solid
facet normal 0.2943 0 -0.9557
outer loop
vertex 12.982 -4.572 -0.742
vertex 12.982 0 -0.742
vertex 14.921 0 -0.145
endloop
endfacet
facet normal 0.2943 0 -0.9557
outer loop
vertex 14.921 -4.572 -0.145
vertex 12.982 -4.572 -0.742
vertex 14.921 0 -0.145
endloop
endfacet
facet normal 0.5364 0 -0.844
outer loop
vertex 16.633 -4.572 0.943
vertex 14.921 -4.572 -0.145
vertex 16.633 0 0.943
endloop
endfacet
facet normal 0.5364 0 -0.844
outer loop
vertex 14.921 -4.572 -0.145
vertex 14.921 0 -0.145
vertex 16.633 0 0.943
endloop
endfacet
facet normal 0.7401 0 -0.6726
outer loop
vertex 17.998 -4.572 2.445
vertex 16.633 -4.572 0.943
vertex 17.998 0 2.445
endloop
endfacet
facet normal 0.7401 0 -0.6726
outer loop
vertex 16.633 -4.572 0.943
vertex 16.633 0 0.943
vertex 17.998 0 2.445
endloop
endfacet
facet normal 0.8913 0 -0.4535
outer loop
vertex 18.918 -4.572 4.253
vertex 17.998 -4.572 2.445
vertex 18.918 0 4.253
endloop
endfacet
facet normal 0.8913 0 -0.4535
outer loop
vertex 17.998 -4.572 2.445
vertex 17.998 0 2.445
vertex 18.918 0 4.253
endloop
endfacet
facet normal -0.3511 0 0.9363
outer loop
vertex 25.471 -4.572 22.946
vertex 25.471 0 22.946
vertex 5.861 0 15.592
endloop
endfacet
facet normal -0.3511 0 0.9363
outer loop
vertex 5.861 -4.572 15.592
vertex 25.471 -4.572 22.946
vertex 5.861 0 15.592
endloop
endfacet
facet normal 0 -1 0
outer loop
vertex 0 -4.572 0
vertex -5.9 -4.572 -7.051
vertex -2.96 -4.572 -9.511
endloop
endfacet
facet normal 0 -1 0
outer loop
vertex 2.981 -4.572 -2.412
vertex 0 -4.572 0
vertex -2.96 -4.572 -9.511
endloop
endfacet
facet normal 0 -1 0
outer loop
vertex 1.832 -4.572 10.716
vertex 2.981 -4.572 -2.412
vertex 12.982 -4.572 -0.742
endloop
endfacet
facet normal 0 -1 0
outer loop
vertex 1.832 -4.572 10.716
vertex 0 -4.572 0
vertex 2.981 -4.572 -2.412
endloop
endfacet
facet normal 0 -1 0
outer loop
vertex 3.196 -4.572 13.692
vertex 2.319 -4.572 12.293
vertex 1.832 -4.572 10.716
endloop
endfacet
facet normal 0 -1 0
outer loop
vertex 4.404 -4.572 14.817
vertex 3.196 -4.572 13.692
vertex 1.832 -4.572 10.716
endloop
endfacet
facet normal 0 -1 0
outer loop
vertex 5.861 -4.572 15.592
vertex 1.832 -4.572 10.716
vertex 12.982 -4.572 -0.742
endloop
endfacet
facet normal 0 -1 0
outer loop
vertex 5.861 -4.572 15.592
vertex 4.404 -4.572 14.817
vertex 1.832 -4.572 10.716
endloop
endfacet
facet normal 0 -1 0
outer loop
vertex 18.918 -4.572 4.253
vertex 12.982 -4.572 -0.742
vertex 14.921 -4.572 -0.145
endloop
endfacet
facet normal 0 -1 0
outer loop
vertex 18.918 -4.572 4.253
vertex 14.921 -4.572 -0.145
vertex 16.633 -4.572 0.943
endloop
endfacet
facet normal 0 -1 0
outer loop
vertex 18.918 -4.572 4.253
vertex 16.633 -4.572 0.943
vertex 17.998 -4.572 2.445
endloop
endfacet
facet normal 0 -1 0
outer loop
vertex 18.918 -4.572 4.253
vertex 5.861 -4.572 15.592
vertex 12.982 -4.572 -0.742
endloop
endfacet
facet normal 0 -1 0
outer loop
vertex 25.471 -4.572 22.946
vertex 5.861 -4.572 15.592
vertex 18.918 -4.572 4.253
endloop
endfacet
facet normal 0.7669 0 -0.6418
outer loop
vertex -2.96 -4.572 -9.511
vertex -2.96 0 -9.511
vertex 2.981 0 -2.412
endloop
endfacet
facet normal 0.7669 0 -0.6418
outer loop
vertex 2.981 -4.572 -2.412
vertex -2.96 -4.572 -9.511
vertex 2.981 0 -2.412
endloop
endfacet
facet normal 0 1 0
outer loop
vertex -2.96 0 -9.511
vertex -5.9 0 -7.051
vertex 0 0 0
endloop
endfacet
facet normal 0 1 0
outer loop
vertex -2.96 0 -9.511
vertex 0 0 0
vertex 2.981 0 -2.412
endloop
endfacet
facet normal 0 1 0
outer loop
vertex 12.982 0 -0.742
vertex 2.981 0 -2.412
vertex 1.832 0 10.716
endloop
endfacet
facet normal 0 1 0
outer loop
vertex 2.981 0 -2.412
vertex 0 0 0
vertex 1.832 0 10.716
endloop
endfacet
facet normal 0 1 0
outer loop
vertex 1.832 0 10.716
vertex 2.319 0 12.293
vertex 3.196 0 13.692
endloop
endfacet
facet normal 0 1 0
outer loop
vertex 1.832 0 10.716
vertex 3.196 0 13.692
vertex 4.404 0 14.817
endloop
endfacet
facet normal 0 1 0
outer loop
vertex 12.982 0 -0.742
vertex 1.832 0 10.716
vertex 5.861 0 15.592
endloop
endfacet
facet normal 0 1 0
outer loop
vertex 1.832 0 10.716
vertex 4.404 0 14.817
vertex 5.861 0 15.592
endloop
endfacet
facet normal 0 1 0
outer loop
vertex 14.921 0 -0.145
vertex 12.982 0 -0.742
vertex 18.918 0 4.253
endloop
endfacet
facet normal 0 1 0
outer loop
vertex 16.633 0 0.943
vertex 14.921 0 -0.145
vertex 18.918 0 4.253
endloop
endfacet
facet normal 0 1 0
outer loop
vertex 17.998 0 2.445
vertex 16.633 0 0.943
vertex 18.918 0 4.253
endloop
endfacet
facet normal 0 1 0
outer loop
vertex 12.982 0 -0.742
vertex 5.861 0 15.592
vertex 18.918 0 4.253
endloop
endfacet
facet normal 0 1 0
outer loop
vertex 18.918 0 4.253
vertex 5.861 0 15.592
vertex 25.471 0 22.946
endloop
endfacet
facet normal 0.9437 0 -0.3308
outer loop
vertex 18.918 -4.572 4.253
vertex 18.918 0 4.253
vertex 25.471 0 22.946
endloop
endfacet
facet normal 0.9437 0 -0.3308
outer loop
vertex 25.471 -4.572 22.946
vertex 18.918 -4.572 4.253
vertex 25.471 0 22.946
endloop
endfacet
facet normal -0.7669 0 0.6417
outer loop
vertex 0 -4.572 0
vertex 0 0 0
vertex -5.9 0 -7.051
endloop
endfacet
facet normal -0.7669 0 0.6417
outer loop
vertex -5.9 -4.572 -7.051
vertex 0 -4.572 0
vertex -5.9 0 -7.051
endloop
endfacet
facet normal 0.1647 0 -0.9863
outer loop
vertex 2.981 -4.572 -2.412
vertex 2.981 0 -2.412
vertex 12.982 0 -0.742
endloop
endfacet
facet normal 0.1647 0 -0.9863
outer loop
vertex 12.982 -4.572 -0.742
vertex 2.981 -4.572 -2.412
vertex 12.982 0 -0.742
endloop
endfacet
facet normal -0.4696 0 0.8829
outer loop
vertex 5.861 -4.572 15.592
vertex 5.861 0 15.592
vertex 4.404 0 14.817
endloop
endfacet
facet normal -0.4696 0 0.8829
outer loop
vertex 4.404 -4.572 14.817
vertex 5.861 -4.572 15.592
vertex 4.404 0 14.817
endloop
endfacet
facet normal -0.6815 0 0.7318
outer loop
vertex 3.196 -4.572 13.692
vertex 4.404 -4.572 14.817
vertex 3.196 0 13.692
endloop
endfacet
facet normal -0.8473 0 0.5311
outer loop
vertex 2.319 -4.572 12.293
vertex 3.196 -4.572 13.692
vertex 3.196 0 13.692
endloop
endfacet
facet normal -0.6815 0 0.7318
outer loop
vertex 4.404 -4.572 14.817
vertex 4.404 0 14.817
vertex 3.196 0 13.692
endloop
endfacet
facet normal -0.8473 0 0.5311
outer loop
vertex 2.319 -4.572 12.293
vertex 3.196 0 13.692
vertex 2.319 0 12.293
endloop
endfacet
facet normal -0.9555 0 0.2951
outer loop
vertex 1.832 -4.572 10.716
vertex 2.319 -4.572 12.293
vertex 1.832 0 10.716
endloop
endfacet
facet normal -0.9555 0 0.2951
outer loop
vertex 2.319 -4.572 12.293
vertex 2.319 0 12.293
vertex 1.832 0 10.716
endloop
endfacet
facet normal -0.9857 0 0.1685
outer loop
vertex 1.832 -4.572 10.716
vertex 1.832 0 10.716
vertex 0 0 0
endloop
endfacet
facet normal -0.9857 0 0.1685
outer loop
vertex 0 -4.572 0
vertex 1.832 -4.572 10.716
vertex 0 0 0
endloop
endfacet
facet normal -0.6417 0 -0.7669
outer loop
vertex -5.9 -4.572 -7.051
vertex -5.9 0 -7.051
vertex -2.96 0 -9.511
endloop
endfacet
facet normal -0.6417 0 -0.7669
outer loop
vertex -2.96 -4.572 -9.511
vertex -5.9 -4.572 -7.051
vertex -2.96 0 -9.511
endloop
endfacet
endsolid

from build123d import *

# Parameters (mm, degrees)
F1_DEPTH = 4.572


with BuildPart() as f1:
    # F0 (on Front) → F1 (new body)
    with BuildSketch(Plane.XZ):
        with BuildLine():
            Line((1.83182, 10.716404), (0, 0))
            Line((0, 0), (2.980503, -2.411659))
            Line((2.980503, -2.411659), (12.981627, -0.742089))
            ThreePointArc((12.981627, -0.742089), (16.633049, 0.943438), (18.917865, 4.253046))
            Line((18.917865, 4.253046), (25.470812, 22.94586))
            Line((25.470812, 22.94586), (5.861357, 15.592153))
            ThreePointArc((5.861357, 15.592153), (3.196287, 13.691717), (1.83182, 10.716404))
        make_face()
        Polygon((2.980503, -2.411659), (0, 0), (-5.900018, -7.051241), (-2.959986, -9.511268), align=None)
    extrude(amount=F1_DEPTH)


solid = f1.part
